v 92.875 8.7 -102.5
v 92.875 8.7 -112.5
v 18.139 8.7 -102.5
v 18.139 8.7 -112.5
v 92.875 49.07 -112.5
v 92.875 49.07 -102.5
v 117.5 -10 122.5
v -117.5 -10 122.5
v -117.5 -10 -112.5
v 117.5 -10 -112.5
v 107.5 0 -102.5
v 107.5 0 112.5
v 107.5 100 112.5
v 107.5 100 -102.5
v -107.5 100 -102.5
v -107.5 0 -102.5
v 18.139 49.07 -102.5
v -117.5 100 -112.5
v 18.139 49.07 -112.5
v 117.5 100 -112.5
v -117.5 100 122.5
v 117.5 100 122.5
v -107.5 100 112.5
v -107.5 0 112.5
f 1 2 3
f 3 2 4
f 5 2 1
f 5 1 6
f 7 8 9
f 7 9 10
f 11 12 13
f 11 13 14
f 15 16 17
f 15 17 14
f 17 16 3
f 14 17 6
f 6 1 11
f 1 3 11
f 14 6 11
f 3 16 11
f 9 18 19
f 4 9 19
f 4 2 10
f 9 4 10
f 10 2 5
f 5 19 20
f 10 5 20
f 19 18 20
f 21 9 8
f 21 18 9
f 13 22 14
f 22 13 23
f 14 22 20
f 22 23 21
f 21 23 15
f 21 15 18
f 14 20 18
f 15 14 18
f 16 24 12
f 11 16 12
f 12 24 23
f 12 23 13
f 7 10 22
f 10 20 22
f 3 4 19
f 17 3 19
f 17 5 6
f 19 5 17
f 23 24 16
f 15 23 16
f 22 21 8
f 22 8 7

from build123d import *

# Parameters (mm, degrees)
IZIM2_W                     = 215
IZIM2_H                     = 215
Y_KSEKLIK_EKSTR_ZYON1_DEPTH = 100
IZIM3_W                     = 235
IZIM3_H                     = 235
Y_KSEKLIK_EKSTR_ZYON2_DEPTH = 10
KES_EKSTR_ZYON1_REACH       = 283.125
IZIM5_W                     = 74.73555952
IZIM5_H                     = 40.37033127


with BuildPart() as part:
    # Çizim2 → Yükseklik-Ekstrüzyon1 (new body)
    with BuildSketch(Plane(origin=(0, 0, 0), x_dir=(1, 0, 0), z_dir=(0, 1, 0))):
        Polygon((117.5, 112.5), (117.5, 102.5), (117.5, -112.5), (117.5, -122.5), (107.5, -122.5), (-107.5, -122.5), (-117.5, -122.5), (-117.5, -112.5), (-117.5, 112.5), (-107.5, 112.5), (107.5, 112.5), align=None)
        with Locations((0, -5)):
            Rectangle(IZIM2_W, IZIM2_H, mode=Mode.SUBTRACT)
    extrude(amount=Y_KSEKLIK_EKSTR_ZYON1_DEPTH)

    # Çizim3 → Yükseklik-Ekstrüzyon2 (add)
    with BuildSketch(Plane.XZ):
        with Locations((0, 5)):
            Rectangle(IZIM3_W, IZIM3_H)
    extrude(amount=Y_KSEKLIK_EKSTR_ZYON2_DEPTH)

    # Çizim5 → Kes-Ekstrüzyon1 (cut, up to next)
    with BuildSketch(Plane(origin=(0, 0, -112.5), x_dir=(-1, 0, 0), z_dir=(0, 0, -1)), mode=Mode.PRIVATE) as kes_ekstr_zyon1_sk1:
        with Locations((-55.507242177, 28.884807523)):
            Rectangle(IZIM5_W, IZIM5_H)
    kes_ekstr_zyon1_tool1 = extrude(kes_ekstr_zyon1_sk1.sketch, amount=-KES_EKSTR_ZYON1_REACH, mode=Mode.PRIVATE) & part.part
    add(kes_ekstr_zyon1_tool1.solids().sort_by_distance((55.507242, 28.884808, -112.5))[0], mode=Mode.SUBTRACT)


solid = part.part
